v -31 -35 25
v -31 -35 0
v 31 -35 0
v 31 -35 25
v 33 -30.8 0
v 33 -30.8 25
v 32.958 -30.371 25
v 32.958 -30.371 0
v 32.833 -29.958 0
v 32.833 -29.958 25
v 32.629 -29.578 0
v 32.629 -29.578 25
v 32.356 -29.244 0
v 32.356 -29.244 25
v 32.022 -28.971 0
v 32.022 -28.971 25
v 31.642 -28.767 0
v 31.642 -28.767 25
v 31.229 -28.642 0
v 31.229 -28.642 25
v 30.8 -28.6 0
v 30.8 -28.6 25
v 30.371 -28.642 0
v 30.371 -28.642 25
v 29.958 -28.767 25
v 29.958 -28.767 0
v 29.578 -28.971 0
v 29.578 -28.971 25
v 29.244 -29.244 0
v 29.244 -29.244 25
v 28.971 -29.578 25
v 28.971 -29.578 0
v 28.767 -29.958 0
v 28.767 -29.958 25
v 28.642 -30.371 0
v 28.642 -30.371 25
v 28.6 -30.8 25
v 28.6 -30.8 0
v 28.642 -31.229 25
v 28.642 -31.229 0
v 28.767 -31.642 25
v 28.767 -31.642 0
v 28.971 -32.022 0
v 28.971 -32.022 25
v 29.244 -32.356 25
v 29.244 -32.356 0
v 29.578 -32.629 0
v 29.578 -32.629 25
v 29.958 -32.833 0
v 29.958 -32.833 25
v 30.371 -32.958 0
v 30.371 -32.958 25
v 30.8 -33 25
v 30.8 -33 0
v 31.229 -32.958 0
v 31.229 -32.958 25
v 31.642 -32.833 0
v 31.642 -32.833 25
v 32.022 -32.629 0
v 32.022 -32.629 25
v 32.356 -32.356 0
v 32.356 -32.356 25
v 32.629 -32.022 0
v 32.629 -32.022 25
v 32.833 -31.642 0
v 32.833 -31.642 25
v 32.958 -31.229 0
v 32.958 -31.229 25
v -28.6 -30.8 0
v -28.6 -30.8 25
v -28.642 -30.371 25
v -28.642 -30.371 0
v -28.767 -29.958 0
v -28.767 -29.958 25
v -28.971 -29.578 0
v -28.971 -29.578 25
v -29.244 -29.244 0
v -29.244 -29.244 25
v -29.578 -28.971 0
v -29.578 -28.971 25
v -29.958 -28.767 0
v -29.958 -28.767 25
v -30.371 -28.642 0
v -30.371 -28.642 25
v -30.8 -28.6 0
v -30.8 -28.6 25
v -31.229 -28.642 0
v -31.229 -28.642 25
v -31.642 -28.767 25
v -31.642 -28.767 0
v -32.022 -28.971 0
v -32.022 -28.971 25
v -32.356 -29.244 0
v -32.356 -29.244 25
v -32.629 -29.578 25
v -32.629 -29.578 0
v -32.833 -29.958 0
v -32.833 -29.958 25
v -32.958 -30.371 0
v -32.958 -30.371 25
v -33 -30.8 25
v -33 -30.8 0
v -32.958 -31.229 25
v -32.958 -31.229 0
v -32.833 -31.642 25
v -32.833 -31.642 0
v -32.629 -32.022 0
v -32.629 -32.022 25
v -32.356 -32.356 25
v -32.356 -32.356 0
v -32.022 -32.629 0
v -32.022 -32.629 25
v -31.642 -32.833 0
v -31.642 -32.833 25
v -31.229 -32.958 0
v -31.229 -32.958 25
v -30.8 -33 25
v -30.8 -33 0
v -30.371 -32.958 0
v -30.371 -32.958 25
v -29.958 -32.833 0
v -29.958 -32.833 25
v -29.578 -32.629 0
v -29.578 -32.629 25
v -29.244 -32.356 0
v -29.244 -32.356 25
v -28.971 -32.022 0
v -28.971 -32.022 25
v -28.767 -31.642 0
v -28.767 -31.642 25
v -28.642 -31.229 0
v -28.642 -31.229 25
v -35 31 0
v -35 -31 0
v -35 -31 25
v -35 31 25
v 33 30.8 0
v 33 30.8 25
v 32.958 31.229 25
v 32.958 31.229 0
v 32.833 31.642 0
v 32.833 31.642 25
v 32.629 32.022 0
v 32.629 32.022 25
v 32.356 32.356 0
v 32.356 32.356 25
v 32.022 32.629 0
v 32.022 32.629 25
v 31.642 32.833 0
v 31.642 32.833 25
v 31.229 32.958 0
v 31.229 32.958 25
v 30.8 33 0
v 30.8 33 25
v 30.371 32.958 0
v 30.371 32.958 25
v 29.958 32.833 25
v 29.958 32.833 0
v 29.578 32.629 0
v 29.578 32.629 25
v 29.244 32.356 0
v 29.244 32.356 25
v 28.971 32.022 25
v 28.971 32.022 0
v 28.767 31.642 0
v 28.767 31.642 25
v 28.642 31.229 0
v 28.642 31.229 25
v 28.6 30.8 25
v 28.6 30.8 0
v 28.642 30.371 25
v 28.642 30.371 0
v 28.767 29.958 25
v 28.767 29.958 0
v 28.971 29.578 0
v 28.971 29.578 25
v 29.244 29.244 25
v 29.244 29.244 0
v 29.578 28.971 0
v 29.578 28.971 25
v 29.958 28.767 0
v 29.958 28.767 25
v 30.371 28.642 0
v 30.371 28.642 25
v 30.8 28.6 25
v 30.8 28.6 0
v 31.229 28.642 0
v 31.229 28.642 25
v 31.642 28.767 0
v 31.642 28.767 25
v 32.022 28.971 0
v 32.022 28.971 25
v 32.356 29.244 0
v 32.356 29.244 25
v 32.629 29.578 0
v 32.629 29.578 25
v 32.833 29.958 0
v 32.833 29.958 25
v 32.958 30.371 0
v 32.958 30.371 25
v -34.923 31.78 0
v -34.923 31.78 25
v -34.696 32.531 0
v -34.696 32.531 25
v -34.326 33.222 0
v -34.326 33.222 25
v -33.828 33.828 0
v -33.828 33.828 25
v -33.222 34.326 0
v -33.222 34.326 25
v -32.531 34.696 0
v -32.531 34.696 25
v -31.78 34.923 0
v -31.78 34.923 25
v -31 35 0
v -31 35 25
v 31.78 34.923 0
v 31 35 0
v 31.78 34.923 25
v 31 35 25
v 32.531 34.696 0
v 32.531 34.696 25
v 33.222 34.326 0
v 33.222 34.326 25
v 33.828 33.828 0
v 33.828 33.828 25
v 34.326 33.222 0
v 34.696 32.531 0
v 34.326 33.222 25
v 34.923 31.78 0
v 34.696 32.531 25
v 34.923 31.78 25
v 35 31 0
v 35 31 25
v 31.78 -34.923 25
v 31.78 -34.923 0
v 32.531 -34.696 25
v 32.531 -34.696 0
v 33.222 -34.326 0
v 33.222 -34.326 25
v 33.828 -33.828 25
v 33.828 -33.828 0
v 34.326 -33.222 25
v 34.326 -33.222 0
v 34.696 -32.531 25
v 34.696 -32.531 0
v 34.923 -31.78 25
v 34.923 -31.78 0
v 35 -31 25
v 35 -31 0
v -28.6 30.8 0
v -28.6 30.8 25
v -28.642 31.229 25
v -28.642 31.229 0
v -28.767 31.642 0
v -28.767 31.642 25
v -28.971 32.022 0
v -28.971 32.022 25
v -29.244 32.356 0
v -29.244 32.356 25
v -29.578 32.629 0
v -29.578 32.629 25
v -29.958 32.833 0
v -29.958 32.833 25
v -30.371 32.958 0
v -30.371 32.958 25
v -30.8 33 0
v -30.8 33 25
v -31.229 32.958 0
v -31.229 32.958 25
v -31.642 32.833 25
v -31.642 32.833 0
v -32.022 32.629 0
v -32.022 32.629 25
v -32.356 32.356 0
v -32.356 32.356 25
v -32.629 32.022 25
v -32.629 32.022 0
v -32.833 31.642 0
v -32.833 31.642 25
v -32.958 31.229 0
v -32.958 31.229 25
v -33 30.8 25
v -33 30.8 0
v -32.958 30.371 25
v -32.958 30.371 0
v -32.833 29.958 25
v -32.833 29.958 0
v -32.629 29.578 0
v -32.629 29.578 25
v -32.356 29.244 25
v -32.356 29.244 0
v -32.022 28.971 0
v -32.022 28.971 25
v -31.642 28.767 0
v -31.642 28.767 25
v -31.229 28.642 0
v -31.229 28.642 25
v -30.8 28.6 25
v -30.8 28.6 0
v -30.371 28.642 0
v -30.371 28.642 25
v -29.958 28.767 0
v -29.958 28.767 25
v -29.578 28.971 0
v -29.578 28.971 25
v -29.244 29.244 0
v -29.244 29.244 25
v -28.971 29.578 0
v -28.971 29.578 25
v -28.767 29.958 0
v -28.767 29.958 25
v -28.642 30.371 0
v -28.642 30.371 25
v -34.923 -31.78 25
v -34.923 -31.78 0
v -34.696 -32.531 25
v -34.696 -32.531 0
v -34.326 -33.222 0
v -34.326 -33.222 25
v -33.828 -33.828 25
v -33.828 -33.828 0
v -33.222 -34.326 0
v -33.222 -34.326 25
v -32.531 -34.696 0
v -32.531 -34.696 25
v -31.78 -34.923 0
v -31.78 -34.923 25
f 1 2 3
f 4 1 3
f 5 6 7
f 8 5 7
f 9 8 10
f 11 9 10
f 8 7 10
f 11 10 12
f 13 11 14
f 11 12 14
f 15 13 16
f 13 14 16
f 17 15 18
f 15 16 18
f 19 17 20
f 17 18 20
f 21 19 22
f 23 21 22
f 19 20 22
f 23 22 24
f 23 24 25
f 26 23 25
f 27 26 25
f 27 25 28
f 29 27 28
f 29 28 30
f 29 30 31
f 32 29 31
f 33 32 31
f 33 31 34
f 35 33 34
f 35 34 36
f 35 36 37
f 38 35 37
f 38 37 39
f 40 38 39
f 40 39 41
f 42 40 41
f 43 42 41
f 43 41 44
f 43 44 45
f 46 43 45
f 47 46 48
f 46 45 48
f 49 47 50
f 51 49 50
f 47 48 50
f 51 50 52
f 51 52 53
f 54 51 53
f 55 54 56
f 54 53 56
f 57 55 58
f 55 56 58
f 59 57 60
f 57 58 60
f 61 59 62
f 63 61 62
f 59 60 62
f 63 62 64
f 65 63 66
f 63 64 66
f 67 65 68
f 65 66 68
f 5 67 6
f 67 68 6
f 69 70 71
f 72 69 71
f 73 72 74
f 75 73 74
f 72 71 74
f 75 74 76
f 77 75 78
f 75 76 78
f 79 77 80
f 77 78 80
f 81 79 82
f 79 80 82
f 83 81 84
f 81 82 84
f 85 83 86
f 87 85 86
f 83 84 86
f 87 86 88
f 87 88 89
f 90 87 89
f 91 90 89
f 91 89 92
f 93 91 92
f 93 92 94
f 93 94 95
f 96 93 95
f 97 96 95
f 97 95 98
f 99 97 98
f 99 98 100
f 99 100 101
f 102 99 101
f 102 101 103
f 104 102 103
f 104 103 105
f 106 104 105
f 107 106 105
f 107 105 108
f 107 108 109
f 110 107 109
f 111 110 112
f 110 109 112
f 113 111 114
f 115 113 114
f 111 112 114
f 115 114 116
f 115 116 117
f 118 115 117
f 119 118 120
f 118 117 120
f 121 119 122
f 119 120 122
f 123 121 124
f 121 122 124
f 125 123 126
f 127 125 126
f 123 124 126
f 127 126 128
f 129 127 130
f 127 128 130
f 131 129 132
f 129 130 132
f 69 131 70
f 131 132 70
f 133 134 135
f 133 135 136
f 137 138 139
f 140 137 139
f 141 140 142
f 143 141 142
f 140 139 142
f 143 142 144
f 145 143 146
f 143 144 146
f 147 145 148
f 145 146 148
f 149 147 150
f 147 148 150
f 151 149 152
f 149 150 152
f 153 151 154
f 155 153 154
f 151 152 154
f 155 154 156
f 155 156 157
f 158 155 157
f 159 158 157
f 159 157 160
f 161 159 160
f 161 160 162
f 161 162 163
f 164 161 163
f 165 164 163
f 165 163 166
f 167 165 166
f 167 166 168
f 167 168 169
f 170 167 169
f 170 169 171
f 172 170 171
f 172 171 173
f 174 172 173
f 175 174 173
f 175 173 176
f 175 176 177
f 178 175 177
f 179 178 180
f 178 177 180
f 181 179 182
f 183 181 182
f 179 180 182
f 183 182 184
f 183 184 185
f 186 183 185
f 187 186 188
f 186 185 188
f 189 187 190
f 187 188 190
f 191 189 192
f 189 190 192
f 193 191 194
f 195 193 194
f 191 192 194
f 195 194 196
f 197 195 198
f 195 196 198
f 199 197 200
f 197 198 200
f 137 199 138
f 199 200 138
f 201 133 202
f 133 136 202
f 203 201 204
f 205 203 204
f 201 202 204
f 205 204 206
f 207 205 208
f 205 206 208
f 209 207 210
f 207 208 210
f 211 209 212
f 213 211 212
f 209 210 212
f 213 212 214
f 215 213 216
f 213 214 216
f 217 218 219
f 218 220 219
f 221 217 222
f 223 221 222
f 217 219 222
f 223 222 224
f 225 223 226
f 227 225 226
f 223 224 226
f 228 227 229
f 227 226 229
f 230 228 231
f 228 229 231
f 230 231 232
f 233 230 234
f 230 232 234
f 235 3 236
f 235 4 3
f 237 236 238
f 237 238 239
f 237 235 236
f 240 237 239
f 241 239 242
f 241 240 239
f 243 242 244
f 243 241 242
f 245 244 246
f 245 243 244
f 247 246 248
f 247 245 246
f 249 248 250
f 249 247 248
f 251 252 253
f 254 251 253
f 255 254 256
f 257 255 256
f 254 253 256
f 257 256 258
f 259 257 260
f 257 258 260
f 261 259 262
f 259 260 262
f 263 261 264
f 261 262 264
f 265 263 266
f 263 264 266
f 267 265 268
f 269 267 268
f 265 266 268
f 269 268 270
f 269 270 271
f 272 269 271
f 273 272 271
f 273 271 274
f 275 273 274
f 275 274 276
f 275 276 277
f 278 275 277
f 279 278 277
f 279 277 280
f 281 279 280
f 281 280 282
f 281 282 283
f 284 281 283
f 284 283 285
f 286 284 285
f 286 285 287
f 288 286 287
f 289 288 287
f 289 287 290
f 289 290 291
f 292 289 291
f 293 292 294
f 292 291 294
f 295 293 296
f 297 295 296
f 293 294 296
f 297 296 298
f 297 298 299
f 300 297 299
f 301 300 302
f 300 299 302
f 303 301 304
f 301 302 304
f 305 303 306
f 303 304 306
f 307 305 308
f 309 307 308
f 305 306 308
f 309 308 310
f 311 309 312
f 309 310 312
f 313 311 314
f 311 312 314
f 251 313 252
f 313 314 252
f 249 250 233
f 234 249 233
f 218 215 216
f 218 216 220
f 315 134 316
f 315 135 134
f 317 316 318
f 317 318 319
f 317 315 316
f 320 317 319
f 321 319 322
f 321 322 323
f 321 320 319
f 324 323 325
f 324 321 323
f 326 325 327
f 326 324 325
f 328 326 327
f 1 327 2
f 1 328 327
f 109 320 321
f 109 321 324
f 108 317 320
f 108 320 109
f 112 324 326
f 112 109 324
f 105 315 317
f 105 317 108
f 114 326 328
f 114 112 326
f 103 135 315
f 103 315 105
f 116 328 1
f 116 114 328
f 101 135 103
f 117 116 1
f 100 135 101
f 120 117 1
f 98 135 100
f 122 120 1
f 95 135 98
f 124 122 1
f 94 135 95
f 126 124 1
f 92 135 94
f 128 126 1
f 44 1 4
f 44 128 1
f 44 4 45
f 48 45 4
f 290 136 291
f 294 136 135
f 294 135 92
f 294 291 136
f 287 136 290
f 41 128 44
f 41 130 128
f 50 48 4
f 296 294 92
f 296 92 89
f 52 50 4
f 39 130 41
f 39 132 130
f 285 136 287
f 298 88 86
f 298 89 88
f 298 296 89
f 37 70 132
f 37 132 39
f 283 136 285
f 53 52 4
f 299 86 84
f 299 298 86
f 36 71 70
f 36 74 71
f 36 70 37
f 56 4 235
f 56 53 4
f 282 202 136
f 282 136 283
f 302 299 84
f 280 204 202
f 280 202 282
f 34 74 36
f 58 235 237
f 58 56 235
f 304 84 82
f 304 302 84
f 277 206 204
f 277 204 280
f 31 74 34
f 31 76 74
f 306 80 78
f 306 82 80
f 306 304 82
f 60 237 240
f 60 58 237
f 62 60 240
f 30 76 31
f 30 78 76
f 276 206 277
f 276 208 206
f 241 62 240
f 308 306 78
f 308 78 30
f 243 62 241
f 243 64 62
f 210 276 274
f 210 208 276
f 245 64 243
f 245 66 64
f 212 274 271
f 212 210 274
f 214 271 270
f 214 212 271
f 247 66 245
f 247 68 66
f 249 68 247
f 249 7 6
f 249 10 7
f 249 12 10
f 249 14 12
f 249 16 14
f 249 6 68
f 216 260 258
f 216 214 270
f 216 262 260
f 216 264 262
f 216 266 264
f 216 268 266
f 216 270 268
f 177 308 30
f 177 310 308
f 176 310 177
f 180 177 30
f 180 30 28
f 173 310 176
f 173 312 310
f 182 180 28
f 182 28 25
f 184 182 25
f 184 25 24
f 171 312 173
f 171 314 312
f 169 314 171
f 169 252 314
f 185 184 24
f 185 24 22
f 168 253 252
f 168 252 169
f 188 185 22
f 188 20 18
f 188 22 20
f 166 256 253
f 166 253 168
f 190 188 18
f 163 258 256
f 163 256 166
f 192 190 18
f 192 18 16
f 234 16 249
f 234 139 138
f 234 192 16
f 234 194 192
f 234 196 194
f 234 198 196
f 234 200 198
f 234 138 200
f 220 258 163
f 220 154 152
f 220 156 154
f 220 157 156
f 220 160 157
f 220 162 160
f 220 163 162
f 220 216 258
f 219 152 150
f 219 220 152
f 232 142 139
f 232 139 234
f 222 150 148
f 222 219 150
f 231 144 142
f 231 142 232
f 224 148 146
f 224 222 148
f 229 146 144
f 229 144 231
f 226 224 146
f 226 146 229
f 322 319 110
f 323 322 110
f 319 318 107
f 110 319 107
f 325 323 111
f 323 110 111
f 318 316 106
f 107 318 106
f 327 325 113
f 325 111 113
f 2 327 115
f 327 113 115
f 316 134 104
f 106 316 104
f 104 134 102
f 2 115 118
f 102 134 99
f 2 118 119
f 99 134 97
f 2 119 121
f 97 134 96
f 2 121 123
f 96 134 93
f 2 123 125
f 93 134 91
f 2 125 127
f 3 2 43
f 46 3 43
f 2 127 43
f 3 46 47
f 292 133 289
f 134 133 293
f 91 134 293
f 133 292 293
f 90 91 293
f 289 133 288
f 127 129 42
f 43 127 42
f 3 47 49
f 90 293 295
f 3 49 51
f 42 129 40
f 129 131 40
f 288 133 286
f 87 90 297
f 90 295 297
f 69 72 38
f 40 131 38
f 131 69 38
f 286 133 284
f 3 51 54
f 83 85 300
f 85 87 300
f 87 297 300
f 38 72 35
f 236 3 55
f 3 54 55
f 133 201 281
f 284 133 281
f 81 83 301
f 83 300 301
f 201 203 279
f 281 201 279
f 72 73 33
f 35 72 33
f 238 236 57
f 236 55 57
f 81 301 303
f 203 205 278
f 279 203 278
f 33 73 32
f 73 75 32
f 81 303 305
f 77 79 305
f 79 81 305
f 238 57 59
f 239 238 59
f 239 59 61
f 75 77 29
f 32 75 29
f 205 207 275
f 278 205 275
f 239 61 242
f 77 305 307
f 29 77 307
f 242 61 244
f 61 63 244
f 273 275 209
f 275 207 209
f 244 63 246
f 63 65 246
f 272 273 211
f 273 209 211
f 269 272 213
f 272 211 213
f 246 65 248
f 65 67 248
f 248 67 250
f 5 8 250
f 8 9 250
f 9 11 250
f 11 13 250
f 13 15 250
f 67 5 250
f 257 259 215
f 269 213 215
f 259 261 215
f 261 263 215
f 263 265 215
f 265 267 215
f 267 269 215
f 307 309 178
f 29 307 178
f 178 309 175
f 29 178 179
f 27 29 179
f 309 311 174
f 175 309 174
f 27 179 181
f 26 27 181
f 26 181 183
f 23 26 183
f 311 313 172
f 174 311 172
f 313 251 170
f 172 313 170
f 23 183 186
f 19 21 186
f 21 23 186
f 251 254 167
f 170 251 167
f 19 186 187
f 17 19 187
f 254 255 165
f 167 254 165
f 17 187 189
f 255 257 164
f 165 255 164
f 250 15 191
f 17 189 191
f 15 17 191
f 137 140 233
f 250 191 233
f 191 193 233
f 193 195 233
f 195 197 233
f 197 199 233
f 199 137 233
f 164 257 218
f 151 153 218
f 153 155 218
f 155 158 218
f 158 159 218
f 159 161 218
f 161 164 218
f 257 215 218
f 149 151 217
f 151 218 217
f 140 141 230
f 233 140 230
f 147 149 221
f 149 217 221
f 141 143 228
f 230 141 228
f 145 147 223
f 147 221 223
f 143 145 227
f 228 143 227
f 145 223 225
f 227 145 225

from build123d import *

# Parameters (mm, degrees)
SKETCH1_W           = 70
SKETCH1_H           = 70
BOSS_EXTRUDE1_DEPTH = 25
SKETCH2_R           = 2.2
CUT_EXTRUDE1_DEPTH  = 56.452682532
FILLET1_R           = 4


with BuildPart() as part:
    # Sketch1 → Boss-Extrude1 (new body)
    with BuildSketch(Plane.XY):
        Rectangle(SKETCH1_W, SKETCH1_H)
    extrude(amount=BOSS_EXTRUDE1_DEPTH)

    # Sketch2 → Cut-Extrude1 (cut, through all)
    with BuildSketch(Plane.XY.offset(25)):
        with Locations((-30.8, 30.8)):
            Circle(SKETCH2_R)
        with Locations((30.8, 30.8)):
            Circle(SKETCH2_R)
        with Locations((30.8, -30.8)):
            Circle(SKETCH2_R)
        with Locations((-30.8, -30.8)):
            Circle(SKETCH2_R)
    extrude(amount=-CUT_EXTRUDE1_DEPTH, mode=Mode.SUBTRACT)

    # Fillet1
    fillet1_edges = [part.edges().sort_by_distance(p)[0] for p in [
        (35, -35, 12.5),
        (-35, -35, 12.5),
        (-35, 35, 12.5),
        (35, 35, 12.5),
    ]]
    fillet(fillet1_edges, radius=FILLET1_R)


solid = part.part
